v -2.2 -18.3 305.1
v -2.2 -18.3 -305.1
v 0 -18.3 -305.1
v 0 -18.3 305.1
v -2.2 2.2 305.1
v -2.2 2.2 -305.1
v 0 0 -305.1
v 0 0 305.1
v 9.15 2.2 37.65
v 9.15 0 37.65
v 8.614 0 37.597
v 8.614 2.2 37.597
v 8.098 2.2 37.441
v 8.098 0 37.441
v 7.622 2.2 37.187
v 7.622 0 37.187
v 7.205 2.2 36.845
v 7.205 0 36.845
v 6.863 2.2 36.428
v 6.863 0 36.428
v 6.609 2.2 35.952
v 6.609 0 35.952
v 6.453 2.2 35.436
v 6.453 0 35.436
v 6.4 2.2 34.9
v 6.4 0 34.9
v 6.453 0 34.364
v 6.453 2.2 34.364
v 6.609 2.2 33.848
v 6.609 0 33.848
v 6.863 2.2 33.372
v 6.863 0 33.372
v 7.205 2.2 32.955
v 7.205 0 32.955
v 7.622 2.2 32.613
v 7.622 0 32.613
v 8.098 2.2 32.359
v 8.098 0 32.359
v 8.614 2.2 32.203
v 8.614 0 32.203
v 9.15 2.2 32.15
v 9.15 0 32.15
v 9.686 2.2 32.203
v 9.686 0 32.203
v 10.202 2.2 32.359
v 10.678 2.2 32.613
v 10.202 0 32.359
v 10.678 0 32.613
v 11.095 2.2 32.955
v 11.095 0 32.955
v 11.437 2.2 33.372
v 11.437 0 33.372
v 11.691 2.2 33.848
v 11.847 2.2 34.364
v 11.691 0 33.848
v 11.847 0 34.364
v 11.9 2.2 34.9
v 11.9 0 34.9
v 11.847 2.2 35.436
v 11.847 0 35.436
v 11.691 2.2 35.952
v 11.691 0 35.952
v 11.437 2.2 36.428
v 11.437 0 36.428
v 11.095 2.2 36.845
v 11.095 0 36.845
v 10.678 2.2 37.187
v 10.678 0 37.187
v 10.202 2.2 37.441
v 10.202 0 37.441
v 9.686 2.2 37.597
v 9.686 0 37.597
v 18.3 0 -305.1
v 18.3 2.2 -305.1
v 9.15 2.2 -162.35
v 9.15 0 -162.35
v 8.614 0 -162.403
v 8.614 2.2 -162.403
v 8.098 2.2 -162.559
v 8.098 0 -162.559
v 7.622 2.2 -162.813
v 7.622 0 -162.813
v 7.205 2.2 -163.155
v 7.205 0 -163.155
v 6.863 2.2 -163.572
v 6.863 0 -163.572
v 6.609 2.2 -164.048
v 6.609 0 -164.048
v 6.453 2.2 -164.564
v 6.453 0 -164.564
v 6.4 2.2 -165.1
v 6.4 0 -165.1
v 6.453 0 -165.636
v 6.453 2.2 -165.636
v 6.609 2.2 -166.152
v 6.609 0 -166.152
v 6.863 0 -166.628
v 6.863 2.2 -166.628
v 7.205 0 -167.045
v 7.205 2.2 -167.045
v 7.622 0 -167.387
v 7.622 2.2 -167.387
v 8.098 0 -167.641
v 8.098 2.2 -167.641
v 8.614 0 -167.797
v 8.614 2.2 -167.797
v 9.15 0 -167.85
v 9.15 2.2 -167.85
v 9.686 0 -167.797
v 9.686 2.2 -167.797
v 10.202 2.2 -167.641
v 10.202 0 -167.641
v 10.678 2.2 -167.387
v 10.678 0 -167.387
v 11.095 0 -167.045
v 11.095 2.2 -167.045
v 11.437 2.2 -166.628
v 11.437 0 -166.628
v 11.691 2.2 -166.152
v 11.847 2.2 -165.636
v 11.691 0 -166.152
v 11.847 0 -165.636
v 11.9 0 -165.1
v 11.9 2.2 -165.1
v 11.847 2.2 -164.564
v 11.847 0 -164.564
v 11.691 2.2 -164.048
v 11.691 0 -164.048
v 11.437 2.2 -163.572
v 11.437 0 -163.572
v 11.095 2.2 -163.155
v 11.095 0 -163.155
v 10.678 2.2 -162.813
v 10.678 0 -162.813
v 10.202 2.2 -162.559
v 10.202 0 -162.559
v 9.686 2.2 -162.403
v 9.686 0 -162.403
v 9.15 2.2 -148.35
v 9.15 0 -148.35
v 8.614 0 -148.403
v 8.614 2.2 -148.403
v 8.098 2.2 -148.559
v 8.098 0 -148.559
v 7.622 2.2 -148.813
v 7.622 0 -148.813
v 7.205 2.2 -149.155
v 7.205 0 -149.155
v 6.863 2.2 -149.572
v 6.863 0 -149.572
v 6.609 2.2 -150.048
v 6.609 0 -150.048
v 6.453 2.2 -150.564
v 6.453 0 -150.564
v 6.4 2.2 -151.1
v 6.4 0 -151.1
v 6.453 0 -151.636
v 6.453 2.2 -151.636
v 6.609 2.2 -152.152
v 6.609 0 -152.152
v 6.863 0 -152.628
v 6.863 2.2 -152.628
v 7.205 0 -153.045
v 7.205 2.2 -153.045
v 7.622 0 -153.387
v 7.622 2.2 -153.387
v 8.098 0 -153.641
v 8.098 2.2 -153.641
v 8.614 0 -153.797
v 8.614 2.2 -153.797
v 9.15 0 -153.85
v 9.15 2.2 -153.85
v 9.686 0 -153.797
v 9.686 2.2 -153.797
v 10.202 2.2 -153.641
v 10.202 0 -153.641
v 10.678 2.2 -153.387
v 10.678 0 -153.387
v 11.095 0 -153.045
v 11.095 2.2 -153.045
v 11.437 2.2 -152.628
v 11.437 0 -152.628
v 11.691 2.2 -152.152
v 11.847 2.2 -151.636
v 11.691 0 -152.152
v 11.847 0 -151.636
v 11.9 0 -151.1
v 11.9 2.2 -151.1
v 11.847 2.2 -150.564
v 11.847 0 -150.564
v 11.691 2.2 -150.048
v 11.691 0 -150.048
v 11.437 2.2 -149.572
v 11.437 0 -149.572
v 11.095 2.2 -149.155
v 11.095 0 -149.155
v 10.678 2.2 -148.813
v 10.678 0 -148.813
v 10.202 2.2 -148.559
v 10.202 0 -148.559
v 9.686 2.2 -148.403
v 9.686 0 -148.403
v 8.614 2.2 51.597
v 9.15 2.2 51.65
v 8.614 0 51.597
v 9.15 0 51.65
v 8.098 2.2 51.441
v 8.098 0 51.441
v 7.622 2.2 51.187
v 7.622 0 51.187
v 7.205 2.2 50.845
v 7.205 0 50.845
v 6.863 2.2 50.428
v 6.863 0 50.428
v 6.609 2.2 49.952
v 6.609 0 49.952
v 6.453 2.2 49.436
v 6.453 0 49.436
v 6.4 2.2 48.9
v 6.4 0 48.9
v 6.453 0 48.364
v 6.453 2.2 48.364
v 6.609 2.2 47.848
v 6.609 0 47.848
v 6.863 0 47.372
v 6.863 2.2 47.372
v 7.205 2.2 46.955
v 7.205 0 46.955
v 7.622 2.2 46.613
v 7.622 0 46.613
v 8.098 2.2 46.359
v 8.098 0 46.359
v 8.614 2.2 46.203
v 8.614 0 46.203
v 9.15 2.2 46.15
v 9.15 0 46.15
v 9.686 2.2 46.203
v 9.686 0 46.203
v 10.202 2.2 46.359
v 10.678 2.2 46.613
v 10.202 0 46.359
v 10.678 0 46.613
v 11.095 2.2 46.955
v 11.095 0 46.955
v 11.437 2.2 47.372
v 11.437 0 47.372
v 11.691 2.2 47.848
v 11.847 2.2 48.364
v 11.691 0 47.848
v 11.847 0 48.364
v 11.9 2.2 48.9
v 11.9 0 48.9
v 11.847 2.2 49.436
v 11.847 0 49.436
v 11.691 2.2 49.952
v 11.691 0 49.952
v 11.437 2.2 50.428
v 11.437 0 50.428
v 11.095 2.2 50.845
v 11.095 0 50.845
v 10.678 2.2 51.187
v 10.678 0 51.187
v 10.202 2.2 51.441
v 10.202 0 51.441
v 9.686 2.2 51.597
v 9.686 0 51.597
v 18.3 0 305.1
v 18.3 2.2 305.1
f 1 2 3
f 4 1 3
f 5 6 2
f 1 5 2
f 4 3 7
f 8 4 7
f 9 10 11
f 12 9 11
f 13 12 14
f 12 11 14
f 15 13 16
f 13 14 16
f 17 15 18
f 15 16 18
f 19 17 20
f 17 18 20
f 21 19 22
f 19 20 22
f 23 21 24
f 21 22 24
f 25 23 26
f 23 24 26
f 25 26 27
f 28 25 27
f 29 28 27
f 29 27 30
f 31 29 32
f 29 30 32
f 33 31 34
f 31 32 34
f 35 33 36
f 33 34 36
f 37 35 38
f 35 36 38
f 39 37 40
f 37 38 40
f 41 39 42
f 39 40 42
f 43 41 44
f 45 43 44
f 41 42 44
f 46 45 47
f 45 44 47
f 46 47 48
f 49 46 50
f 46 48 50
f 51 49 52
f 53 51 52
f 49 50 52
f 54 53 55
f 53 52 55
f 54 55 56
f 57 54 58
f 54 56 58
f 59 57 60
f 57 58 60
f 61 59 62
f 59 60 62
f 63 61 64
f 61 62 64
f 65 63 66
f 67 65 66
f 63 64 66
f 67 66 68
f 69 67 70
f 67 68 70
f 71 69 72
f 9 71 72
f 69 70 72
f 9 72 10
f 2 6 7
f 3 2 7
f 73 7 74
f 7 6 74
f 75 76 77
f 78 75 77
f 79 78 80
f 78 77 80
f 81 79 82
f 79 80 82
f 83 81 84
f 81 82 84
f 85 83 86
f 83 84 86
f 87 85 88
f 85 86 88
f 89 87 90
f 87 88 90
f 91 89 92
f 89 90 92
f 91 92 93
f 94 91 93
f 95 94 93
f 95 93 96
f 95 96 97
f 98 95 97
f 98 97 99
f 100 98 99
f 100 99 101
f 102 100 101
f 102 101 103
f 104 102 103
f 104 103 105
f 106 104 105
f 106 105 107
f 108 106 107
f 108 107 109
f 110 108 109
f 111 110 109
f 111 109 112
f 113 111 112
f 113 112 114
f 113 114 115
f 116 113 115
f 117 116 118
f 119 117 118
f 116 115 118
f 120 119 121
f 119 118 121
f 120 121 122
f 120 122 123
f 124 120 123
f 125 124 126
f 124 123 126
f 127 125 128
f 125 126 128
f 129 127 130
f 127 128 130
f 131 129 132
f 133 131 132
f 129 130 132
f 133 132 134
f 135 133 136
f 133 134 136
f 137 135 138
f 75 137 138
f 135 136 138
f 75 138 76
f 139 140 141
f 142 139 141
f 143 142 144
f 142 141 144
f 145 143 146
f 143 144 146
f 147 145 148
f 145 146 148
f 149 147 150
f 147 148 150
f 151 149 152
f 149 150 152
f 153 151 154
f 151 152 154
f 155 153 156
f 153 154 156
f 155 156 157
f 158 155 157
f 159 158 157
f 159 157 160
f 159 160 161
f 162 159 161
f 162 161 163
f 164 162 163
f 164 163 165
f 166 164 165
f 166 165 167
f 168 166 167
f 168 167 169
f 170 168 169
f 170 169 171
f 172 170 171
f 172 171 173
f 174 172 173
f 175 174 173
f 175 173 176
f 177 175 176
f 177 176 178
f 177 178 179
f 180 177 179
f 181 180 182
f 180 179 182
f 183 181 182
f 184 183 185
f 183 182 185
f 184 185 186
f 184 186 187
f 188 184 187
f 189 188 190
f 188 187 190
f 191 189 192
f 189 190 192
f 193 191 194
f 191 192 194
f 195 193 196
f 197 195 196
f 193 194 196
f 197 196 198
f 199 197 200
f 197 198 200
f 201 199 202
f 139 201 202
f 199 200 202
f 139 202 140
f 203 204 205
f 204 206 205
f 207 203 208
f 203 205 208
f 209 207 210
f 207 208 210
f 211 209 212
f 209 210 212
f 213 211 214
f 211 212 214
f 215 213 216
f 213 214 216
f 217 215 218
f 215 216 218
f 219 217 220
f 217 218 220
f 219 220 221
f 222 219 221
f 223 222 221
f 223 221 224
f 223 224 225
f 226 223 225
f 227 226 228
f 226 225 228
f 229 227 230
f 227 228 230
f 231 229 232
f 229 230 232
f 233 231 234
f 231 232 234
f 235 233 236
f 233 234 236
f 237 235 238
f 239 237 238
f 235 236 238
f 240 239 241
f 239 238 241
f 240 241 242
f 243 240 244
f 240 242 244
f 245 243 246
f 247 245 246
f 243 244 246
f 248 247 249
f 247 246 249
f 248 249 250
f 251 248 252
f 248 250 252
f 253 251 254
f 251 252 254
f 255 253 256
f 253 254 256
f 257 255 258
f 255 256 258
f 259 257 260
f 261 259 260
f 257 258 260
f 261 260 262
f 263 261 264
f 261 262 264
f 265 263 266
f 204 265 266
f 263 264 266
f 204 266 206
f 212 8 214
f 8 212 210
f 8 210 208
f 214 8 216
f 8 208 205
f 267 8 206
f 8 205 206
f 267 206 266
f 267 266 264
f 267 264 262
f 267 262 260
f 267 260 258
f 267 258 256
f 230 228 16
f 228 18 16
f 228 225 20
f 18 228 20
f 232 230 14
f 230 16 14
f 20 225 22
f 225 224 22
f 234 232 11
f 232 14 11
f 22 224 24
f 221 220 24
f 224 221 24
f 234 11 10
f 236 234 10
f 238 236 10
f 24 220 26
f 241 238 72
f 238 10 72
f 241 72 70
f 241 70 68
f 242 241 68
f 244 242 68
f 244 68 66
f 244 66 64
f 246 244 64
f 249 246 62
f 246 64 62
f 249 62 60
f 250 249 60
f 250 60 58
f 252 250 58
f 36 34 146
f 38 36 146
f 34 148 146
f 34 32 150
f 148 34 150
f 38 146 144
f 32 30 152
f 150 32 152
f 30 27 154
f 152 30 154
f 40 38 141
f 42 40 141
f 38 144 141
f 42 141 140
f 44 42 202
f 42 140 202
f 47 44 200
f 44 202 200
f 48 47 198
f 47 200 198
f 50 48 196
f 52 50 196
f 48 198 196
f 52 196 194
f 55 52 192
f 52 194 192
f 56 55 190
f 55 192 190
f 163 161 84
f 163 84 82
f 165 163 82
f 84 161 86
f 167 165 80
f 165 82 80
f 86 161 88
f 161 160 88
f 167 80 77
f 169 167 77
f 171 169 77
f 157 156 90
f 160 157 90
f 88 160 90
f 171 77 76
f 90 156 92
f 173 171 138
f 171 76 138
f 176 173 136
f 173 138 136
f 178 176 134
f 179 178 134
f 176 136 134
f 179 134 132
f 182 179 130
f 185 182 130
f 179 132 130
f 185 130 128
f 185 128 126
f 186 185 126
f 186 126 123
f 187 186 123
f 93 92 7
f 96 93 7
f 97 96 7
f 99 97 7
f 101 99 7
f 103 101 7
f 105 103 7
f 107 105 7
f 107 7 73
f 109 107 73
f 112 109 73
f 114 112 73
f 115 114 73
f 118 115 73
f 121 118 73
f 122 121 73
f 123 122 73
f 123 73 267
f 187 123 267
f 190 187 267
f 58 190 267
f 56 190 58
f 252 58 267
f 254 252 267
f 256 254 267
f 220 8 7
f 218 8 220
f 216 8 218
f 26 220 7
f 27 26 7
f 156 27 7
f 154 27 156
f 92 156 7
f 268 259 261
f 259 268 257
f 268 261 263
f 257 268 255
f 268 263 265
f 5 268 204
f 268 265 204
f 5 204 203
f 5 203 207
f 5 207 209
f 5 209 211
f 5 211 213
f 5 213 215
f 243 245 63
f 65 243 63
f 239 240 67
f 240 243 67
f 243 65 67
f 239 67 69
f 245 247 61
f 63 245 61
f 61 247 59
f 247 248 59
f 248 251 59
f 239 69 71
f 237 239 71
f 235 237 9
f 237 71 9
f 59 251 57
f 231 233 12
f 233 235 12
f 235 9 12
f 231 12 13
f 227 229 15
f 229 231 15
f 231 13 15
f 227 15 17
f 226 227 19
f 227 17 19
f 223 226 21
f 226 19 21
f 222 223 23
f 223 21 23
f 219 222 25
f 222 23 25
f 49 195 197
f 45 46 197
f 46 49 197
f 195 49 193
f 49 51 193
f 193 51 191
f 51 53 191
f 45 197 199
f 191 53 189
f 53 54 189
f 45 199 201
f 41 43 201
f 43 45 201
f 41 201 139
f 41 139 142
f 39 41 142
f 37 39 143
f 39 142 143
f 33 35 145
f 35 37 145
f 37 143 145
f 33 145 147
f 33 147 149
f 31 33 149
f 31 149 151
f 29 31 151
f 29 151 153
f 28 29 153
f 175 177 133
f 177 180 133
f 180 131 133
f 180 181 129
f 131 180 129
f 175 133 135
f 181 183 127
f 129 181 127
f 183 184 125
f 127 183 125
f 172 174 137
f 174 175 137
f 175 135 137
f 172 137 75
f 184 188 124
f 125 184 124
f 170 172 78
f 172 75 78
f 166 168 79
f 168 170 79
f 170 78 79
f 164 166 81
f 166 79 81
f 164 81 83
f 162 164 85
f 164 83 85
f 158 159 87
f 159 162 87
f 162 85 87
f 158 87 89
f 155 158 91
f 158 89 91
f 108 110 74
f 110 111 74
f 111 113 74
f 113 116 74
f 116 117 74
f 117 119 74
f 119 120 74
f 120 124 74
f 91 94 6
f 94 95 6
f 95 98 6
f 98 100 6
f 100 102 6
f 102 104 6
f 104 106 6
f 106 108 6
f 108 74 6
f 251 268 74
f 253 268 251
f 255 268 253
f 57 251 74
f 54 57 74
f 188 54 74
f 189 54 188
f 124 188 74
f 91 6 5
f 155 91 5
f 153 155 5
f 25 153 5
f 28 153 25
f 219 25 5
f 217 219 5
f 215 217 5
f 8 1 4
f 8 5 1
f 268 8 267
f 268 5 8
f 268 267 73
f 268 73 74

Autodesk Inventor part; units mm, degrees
ref_plane "YZ Plane" through (0, 0, 0) normal (1, 0, 0) x (0, 1, 0)
ref_plane "XZ Plane" through (0, 0, 0) normal (0, 1, 0) x (-1, 0, 0)
ref_plane "XY Plane" through (0, 0, 0) normal (0, 0, 1) x (1, 0, 0)
sketch "Esquisse1" plane through (0, 0, 0) normal (0, 0, 1) x (1, 0, 0)
  line L0 (0, 0) -> (18.3, 0)
  line L1 (18.3, 0) -> (18.3, 2.2)
  line L2 (18.3, 2.2) -> (-2.2, 2.2)
  line L3 (-2.2, 2.2) -> (-2.2, -18.3)
  line L4 (-2.2, -18.3) -> (0, -18.3)
  line L5 (0, -18.3) -> (0, 0)
  dimension "Epaisseur_cornière" = 2.2
  dimension "Largueur" = 20.5
extrude "Embase" add sketch "Esquisse1" along normal mid plane 610.2
sketch "Esquisse2" plane through (0, 0, 0) normal (0, 1, 0) x (-1, 0, 0)
  line L0 (2.2, 305.1) -> (-18.3, 284.6)
  line L1 (-18.3, 284.6) -> (-18.3, 305.1)
  line L2 (-18.3, 305.1) -> (2.2, 305.1)
  line L3 (-18.3, 305.1) -> (2.2, 305.1) construction
  line L4 (2.2, -305.1) -> (2.2, 305.1) construction
  line L5 (-18.3, -305.1) -> (-18.3, 305.1) construction
  point P0 (0, 0)
  dimension "d4" = 45
extrude "Découpe à 45" [suppressed]
mirror "Symétrie découpe" [suppressed]
sketch "Esquisse3" plane through (-2.2, 2.2, 305.1) normal (0, 1, 0) x (1, 0, 0)
  line L0 (0, 610.2) -> (20.5, 610.2) construction
  line L1 (20.5, 610.2) -> (20.5, 0) construction
  line L2 (2.2, 0) -> (2.2, 610.2) construction
  point P0 (2.2, 305.1)
  point P1 (11.35, 470.2)
  point P2 (11.35, 456.2)
  dimension "d7" = 14
  dimension "d8" = 140
  dimension "d9" = 9.15
  dimension "d17" = 18.3
hole "Perçage1" at (9.15, 2.2, -165.1) at (9.15, 2.2, -151.1) direction (0, -1, 0) diameter 5.5 end through all clearance for "Vis à tête plate fraisée ISO 2009/7046" size "M5" standard "ISO"
pattern_linear "Réseau rectangulaire1" count 2 spacing 200 along (0, 0, 1) of "Perçage1"
equation "\"d9\" = 0.5 * d17"
properties part number "1400-06-04 Profilé vertical chaniere" material "Aluminium 6061"
